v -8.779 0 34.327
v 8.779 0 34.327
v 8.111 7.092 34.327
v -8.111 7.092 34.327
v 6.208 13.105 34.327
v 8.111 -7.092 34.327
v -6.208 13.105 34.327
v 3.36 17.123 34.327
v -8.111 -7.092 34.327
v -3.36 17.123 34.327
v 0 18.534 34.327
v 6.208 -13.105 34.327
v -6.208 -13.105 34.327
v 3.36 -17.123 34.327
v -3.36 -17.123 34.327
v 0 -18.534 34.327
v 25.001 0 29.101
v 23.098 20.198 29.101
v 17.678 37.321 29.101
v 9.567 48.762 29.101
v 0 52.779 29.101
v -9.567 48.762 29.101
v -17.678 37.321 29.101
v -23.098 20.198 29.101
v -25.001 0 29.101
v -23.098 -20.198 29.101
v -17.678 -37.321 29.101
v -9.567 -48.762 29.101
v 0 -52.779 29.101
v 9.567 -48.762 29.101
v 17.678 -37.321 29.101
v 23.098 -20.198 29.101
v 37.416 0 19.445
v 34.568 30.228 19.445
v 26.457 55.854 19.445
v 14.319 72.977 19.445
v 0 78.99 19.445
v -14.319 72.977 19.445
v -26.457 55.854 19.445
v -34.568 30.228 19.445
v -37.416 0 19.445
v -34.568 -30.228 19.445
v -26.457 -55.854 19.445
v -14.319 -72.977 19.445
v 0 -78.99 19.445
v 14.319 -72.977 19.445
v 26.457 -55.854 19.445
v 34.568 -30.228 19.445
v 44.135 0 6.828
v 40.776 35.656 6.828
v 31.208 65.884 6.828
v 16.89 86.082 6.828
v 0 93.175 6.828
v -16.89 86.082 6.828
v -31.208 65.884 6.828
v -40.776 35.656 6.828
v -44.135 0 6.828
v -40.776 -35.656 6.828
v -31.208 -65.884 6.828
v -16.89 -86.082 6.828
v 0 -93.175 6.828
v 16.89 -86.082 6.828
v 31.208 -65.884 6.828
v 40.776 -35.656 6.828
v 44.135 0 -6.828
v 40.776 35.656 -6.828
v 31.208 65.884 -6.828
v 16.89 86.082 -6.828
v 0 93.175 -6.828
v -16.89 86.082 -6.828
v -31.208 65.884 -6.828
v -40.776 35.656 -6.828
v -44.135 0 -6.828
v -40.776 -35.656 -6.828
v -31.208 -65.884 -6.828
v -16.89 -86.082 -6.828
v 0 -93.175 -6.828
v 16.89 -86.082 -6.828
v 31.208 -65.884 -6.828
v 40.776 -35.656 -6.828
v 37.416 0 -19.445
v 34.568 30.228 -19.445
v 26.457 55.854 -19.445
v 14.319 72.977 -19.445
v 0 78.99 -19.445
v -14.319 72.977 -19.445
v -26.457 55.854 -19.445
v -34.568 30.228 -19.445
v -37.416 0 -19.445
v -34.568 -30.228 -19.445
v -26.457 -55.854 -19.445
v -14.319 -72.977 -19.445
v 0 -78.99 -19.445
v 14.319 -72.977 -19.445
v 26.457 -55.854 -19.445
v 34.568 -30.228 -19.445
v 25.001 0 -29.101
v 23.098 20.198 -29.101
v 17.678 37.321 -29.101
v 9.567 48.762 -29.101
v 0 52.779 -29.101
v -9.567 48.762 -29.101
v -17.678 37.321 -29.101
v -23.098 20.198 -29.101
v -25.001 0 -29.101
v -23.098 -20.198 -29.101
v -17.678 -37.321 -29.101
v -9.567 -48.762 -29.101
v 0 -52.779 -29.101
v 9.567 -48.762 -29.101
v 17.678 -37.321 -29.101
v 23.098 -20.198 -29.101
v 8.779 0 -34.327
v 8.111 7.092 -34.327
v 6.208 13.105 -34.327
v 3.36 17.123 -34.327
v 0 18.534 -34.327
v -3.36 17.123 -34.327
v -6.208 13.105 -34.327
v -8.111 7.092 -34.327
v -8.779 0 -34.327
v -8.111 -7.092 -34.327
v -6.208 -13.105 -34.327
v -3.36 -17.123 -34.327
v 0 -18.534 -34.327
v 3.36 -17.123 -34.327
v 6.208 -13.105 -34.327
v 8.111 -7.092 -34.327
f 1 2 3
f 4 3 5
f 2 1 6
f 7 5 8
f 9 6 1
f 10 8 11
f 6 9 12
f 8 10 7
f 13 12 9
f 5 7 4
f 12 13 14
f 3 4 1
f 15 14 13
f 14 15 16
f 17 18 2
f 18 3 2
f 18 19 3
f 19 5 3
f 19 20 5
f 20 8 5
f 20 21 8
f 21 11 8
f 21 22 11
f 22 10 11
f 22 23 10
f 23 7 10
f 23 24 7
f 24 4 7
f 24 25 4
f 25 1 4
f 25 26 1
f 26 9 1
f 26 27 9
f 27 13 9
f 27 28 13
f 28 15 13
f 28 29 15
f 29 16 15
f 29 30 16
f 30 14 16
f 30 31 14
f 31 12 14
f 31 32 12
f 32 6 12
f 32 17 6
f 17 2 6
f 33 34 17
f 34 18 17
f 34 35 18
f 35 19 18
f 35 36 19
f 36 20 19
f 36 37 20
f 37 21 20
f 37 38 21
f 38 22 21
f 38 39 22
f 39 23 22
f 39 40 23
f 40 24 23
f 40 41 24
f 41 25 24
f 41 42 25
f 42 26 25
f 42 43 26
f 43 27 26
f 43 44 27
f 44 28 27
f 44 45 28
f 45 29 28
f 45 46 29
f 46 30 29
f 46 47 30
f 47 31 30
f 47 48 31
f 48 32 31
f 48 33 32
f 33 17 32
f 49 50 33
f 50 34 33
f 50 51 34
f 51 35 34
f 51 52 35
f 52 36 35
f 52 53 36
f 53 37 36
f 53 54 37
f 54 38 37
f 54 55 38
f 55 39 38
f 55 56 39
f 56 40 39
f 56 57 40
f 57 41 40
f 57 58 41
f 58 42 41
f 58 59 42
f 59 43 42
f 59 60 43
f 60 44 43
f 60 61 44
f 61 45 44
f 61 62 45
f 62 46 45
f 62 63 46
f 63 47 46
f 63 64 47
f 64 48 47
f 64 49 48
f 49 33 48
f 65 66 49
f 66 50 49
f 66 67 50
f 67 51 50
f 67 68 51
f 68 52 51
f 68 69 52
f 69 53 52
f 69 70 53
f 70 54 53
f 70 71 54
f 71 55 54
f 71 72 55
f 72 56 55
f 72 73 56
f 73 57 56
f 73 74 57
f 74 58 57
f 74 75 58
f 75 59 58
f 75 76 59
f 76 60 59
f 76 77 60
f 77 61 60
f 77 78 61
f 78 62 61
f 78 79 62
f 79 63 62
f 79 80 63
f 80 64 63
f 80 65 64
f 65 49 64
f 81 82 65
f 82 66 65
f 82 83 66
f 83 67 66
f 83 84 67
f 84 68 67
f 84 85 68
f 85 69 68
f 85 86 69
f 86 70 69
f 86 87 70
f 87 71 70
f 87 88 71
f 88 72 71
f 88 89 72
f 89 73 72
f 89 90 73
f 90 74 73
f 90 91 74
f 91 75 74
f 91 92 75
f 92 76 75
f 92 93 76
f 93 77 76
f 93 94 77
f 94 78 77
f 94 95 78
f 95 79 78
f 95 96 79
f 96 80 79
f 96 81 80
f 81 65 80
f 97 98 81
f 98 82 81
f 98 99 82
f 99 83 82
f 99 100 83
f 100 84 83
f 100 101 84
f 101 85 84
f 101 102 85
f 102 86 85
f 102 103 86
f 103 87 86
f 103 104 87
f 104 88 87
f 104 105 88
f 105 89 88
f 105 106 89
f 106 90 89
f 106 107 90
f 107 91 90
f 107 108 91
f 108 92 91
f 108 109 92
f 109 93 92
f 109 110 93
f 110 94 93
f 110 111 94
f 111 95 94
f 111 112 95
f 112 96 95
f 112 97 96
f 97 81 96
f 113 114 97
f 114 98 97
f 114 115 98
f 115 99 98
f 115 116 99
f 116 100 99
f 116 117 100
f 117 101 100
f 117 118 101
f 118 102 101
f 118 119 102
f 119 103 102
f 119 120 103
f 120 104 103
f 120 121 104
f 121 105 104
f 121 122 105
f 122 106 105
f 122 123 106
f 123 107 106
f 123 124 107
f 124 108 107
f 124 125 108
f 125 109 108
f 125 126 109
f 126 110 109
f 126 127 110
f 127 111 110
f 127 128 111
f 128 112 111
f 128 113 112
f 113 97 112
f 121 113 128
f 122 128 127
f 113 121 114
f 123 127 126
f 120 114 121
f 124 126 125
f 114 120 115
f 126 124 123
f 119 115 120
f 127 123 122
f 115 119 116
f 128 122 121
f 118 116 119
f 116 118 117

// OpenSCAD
// Generated by SolidPython 1.0.1 on 2020-07-29 00:46:49


scale(v = [9, 19, 7]) {
	sphere(r = 5);
}
/***********************************************
*********      SolidPython code:      **********
************************************************
 
# import packages: SolidPython
from solid import *
from solid.utils import *
from itertools import chain, combinations, permutations


class Resize:

    def __init__(self, scad_file):
        self.scad_file = scad_file
        #self.scad_file = import_scad(scad_file)
        # cone/cylinder param:
        self.r1 = 0
        self.r2 = 0
        self.h = 0
        # rectangular prism param:
        self.w = 0
        self.l = 0
        # ellipse param:
        self.r = 0

    # import OpenScad code (file name corresponds to shape)


    # classify shape + parameters
    def assign(self, param1, param2, param3):
        if self.scad_file == 'cone.scad':
            self.r1 = param1
            self.r2 = param2
            self.h = param3
        elif self.scad_file == 'cylinder.scad':
            self.r1 = param1
            self.r2 = param2
            self.h = param3
        elif self.scad_file == 'rectangularPrism.scad':
            self.h = param1
            self.l = param2
            self.w = param3
        else:
            self.r = param1
            self.h = param2

    # resize parameters
    def iterate(self):
        x = range(3, 20, 2)
        i = 1
        if self.scad_file == 'cone.scad':
            tempList = list(permutations(x, 2))
            for temp in tempList:
                param1 = temp[0]
                param2 = temp[1]
                filepath = 'produced_scad_files/' + 'cone' + str(param1) + '_' + str(param2) + '_' + '.scad'
                scad_render_to_file(cylinder(h=param1, r1=param2, r2=0), filepath)

        elif self.scad_file == 'cylinder.scad':
            tempList = list(permutations(x, 3))
            for temp in tempList:
                param1 = temp[0]
                param2 = temp[1]
                filepath = 'produced_scad_files/' + 'cylinder' + str(param1) + '_' + str(param2) + '_' + '.scad'
                scad_render_to_file(cylinder(h=param1, r1=param2, r2=param2), filepath)

        elif self.scad_file == 'rectangularPrism.scad':
            tempList = list(permutations(x, 3))
            for temp in tempList:
                param1 = temp[0]
                param2 = temp[1]
                param3 = temp[2]
                filepath = 'produced_scad_files/' + 'rectangularPrism' + str(param1) + '_' + str(param2) + '_' + str(
                    param3) + '.scad'
                scad_render_to_file(cube(size=(param1, param2, param3)), filepath)

        elif self.scad_file == 'ellipse.scad':
            tempList = list(permutations(x, 4))
            for temp in tempList:
                param1 = temp[0]
                param2 = temp[1]
                param3 = temp[2]
                param4 = temp[3]
                filepath = 'produced_scad_files/' + 'ellipse' + str(param1) + '_' + str(param2) + '_' + str(param3) + '_' + str(param4) + '.scad'
                scad_render_to_file(scale([param1, param2, param3])(sphere(r=param4)), filepath)

    def render_to_scadfile(self):
        scad_render_to_file(scad, 'example.scad') 
 
************************************************/
